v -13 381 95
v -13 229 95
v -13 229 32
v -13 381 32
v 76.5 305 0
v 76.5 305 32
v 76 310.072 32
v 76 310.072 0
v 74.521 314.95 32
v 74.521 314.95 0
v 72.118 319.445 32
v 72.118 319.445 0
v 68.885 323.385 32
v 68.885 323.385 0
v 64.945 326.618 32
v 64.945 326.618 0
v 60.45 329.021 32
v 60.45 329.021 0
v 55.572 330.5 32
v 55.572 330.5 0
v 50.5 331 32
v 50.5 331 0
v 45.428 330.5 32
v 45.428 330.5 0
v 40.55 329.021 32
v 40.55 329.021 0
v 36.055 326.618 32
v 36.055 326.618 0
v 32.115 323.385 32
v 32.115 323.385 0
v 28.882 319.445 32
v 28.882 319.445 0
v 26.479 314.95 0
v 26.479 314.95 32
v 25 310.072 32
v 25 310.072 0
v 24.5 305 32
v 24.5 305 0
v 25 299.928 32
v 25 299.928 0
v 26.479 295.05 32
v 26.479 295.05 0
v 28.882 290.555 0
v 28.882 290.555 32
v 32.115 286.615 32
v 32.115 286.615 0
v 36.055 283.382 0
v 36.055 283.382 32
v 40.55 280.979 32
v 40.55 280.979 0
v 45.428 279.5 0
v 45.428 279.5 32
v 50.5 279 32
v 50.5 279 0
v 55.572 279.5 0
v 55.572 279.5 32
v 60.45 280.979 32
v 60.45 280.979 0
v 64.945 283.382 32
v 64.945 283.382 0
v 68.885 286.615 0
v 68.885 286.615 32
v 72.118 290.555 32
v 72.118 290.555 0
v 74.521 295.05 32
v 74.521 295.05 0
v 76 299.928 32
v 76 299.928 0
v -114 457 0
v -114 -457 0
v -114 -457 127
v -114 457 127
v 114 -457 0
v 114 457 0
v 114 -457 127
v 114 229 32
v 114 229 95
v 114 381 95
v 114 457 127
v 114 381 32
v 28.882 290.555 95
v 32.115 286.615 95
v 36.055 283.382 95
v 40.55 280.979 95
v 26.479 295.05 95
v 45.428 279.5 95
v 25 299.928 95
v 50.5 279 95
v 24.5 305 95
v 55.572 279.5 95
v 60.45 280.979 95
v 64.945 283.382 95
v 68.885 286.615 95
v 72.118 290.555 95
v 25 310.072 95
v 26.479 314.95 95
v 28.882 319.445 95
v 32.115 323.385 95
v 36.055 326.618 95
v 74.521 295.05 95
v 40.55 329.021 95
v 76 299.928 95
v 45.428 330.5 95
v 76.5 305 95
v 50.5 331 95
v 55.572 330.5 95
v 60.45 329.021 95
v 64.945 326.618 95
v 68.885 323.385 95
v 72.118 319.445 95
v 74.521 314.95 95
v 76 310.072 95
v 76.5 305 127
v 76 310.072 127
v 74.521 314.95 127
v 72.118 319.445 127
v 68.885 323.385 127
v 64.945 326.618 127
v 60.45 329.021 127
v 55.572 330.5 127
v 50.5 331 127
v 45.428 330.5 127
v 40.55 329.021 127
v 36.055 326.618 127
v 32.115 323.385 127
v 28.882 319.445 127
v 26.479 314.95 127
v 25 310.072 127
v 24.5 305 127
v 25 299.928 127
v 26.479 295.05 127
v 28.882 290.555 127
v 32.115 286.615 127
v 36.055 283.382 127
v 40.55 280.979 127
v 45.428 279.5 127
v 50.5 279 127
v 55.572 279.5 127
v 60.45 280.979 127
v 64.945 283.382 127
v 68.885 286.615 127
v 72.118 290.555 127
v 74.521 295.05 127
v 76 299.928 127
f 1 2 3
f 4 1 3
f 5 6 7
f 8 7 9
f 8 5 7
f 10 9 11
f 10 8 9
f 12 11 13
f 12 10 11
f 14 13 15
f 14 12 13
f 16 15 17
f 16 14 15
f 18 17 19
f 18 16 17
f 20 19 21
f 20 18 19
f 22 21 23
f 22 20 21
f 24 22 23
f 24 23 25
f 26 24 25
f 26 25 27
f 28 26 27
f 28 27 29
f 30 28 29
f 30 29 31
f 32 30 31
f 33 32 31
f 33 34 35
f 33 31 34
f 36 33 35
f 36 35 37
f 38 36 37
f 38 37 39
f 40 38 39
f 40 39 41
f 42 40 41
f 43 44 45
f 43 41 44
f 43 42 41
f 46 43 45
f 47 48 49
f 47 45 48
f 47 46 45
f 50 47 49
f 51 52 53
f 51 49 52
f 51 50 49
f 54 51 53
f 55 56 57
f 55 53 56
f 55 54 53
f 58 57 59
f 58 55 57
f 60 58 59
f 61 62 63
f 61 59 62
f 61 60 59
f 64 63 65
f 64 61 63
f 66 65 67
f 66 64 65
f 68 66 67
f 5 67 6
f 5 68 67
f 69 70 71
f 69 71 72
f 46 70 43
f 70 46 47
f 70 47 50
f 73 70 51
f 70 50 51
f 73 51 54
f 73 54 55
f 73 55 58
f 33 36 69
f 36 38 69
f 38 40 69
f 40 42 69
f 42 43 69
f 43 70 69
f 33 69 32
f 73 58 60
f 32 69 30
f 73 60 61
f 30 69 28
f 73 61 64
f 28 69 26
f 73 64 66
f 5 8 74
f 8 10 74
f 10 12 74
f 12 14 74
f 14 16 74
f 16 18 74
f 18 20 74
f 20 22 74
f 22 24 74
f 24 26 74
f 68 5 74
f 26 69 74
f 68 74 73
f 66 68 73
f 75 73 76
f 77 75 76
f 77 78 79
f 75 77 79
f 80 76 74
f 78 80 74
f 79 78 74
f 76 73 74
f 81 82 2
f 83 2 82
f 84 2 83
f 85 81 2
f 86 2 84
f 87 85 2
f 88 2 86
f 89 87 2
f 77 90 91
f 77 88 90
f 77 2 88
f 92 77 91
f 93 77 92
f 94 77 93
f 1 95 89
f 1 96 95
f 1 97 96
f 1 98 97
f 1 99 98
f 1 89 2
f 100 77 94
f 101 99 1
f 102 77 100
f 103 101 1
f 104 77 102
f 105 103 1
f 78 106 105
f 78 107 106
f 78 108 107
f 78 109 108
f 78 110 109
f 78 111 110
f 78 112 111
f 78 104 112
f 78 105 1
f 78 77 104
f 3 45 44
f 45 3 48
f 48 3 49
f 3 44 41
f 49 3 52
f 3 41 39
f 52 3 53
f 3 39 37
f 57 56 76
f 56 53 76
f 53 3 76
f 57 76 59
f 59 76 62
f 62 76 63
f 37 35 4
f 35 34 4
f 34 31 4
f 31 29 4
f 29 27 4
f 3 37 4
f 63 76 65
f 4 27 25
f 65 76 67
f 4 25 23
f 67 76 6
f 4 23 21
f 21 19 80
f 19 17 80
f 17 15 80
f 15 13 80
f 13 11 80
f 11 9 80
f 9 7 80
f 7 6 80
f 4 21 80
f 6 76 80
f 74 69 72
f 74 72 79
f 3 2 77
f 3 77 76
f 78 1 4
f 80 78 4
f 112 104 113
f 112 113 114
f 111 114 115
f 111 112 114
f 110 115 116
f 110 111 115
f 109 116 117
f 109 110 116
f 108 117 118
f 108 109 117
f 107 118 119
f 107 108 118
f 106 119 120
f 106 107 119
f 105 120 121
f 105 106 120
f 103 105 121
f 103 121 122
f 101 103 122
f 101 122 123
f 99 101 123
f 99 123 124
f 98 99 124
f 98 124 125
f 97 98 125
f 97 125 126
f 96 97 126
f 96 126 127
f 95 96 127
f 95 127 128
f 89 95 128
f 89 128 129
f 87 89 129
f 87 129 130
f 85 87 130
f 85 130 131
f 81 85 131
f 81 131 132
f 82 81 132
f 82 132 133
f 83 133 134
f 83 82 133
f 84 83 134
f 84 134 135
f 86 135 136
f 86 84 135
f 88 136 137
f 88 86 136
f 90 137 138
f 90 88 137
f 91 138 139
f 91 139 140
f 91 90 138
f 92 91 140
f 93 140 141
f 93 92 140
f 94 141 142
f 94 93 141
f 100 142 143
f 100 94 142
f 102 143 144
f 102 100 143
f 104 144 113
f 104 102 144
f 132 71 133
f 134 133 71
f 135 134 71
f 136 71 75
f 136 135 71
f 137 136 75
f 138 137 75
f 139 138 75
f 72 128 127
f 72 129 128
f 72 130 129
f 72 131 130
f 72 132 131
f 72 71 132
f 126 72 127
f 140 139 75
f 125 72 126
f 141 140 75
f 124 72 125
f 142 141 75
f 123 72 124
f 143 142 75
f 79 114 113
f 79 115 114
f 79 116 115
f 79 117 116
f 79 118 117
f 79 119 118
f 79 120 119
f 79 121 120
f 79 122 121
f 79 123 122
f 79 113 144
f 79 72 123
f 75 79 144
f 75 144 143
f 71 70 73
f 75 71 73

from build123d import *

# Parameters (mm, degrees)
SKETCH3_W           = 228
SKETCH3_H           = 914
BOSS_EXTRUDE2_DEPTH = 127
SKETCH4_W           = 63
SKETCH4_H           = 152
CUT_EXTRUDE1_DEPTH  = 127
SKETCH6_R           = 26
CUT_EXTRUDE2_DEPTH  = 127


with BuildPart() as part:
    # Sketch3 → Boss-Extrude2 (new body)
    with BuildSketch(Plane.XY):
        Rectangle(SKETCH3_W, SKETCH3_H)
    extrude(amount=BOSS_EXTRUDE2_DEPTH)

    # Sketch4 → Cut-Extrude1 (cut)
    with BuildSketch(Plane(origin=(114, 0, 0), x_dir=(0, 0, -1), z_dir=(1, 0, 0))):
        with Locations((-63.5, 305)):
            Rectangle(SKETCH4_W, SKETCH4_H)
    extrude(amount=-CUT_EXTRUDE1_DEPTH, mode=Mode.SUBTRACT)

    # Sketch6 → Cut-Extrude2 (cut)
    with BuildSketch(Plane.XY):
        with Locations((50.5, 305)):
            Circle(SKETCH6_R)
    extrude(amount=CUT_EXTRUDE2_DEPTH, mode=Mode.SUBTRACT)


solid = part.part
